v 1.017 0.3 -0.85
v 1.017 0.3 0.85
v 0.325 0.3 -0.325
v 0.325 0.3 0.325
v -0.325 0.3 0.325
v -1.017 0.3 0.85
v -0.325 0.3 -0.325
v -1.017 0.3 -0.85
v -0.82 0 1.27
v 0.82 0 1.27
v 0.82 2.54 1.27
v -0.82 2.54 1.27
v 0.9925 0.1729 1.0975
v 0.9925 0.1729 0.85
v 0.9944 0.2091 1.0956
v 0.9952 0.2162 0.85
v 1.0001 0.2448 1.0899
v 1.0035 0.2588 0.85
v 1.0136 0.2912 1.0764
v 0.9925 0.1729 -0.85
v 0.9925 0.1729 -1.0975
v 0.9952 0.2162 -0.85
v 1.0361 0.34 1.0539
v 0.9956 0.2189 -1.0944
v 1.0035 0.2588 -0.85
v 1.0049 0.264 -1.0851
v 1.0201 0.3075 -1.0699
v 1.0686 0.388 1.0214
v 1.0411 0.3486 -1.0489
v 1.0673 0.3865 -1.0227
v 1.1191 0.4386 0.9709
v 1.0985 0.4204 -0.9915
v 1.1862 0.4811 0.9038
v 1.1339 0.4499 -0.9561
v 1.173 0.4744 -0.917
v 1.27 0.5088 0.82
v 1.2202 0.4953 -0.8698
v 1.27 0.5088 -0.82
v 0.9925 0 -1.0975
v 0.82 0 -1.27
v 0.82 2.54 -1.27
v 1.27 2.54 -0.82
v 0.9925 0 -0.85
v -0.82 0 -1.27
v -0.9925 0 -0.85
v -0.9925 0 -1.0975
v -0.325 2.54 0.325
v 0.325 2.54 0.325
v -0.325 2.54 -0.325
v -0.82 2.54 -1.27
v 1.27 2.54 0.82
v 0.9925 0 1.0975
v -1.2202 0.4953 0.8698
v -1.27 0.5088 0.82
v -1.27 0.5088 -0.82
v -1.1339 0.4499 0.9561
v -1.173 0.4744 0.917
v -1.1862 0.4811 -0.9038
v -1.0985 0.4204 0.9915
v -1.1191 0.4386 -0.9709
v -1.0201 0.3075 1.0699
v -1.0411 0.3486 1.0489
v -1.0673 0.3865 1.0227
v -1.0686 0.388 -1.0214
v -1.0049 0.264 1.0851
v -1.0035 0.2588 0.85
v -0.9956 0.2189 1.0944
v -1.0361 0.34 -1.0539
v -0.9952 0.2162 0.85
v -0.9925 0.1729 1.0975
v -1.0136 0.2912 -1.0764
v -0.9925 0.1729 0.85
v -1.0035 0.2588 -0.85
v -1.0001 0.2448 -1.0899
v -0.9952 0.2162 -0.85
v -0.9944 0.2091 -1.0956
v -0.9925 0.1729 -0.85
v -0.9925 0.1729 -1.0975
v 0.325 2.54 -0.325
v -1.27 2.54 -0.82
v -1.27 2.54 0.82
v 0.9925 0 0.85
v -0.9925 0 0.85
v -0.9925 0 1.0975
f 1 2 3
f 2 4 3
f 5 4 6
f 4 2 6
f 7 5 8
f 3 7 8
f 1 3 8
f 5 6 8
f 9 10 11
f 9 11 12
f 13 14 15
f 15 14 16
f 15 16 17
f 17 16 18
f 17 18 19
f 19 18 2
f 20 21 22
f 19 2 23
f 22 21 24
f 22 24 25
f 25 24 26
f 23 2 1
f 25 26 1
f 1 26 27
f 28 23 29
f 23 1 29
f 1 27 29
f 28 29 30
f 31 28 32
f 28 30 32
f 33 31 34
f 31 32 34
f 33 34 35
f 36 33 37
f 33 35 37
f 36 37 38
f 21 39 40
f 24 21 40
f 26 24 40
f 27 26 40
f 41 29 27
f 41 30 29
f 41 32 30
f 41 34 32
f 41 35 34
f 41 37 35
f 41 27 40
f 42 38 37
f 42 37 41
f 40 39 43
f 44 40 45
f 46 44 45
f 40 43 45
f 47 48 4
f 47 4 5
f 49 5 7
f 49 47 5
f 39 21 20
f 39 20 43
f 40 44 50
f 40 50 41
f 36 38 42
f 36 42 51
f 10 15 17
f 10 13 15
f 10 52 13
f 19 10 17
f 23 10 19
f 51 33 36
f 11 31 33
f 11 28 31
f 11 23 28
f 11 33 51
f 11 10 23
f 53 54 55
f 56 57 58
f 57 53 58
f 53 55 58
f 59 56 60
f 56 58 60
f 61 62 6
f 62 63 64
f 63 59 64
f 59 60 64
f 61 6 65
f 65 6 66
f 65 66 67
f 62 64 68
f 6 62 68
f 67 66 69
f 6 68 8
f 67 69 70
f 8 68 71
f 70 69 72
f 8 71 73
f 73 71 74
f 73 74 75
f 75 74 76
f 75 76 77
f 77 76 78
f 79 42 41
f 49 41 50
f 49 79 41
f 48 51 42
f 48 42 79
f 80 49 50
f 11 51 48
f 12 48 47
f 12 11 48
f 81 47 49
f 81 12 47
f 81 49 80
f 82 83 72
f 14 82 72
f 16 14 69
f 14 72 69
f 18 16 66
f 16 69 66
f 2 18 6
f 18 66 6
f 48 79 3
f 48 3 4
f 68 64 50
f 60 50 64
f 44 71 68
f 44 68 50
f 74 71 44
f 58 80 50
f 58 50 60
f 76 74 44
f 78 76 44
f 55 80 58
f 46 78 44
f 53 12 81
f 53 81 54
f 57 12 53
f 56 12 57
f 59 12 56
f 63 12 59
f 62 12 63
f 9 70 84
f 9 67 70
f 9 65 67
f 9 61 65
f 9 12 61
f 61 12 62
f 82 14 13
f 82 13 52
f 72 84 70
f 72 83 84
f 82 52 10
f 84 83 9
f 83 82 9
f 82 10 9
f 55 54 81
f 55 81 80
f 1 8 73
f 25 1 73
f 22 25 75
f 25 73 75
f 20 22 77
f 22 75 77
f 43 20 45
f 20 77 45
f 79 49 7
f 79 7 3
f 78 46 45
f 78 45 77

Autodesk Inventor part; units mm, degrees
ref_plane "YZ Plane" through (0, 0, 0) normal (1, 0, 0) x (0, 1, 0)
ref_plane "XY Plane" through (0, 0, 0) normal (0, 0, 1) x (1, 0, 0)
sketch "Sketch1" plane through (0, 0, 0) normal (0, 1, 0) x (-1, 0, 0)
  line L0 (1.27, -1.27) -> (-1.27, -1.27)
  line L1 (-1.27, -1.27) -> (-1.27, 1.27)
  line L2 (-1.27, 1.27) -> (1.27, 1.27)
  line L3 (1.27, 1.27) -> (1.27, -1.27)
  point P0 (0, 0)
  point P1 (0, -1.27)
  point P2 (-1.27, 0)
  dimension "d0" = 2.54
  dimension "d1" = 2.54
extrude "Extrusion1" add sketch "Sketch1" along normal blind 2.54
sketch "Sketch2" plane through (0, 2.54, 0) normal (0, 1, 0) x (1, 0, 0)
  line L0 (-0.325, 0.325) -> (0.325, 0.325)
  line L1 (0.325, 0.325) -> (0.325, -0.325)
  line L2 (0.325, -0.325) -> (-0.325, -0.325)
  line L3 (-0.325, -0.325) -> (-0.325, 0.325)
  point P0 (0, 0)
  point P1 (0, 0.325)
  point P2 (0.325, 0)
  dimension "d4" = 0.65
  dimension "d5" = 0.65
extrude "Extrusion2" cut sketch "Sketch2" against normal up to next
chamfer "Chamfer1" distance 0.45 angle 45 4 edges at (1.27, 1.27, 1.27) (-1.27, 1.27, 1.27) (1.27, 1.27, -1.27) (-1.27, 1.27, -1.27)
sketch "Sketch3" plane through (0, 0, 0) normal (1, 0, 0) x (0, 1, 0)
  line L0 (0, -0.82) -> (2.54, -0.82) projected
  line L1 (0, 0.82) -> (0, -0.82) projected
  line L2 (2.54, 0.82) -> (0, 0.82) projected
  line L3 (2.54, -0.82) -> (2.54, 0.82) projected
  line L4 (2.54, 1.27) -> (2.54, 0.82) projected
  line L5 (2.54, 0.82) -> (0, 0.82) projected
  line L6 (0, 0.82) -> (0, 1.27) projected
  line L7 (0, 1.27) -> (2.54, 1.27) projected
  line L8 (2.54, -0.82) -> (2.54, -1.27) projected
  line L9 (2.54, -1.27) -> (0, -1.27) projected
  line L10 (0, -1.27) -> (0, -0.82) projected
  line L11 (0, -0.82) -> (2.54, -0.82) projected
  line L12 (0, 0.82) -> (0, -0.82) projected
  line L13 (0, 0.85) -> (0.3, 0.85)
  line L14 (0.3, 0.85) -> (0.3, -0.85)
  line L15 (0.3, -0.85) -> (0, -0.85)
  line L16 (0, -0.85) -> (0, 0.85)
  point P0 (0, 0)
  point P1 (0.3, 0)
  dimension "d11" = 0.3
  dimension "d16" = 1.7
extrude "Extrusion3" cut sketch "Sketch3" along normal mid plane 2.54 contours L1 L2 L14 L0 | L0 L14 L15 L10 | L6 L13 L14 L2
sketch "Sketch5" plane through (0, 0, 0) normal (0, 0, 1) x (1, 0, 0)
  line L0 (-1.27, 0.3) -> (-1.27, 2.54) projected
  line L1 (-1.27, 2.54) -> (-1.27, 0.3) projected
  line L2 (-1.27, 0.3) -> (-1.27, 2.54) projected
  line L3 (-1.24, 0.3) -> (-1.27, 0.3) projected
  line L4 (-1.27, 0.3) -> (-1.27, 2.54) projected
  line L5 (-1.27, 2.54) -> (-0.82, 2.54) projected
  line L6 (-0.82, 2.54) -> (-0.82, 0) projected
  line L7 (-0.82, 0) -> (-1.24, 0) projected
  line L8 (-1.24, 0) -> (-1.24, 0.3) projected
  line L9 (-0.9925, 0) -> (-0.9925, 0.1729)
  arc A0 (-0.9925, 0.1729) -> (-1.27, 0.5088) centre (-1.3346, 0.1729) ccw
  point P0 (0, 0)
extrude "Extrusion5" cut sketch "Sketch5" along normal mid plane 2.54 contours L0 A0 L9 L7 L8 L3
mirror "Mirror2" about plane through (0, 0, 0) normal (1, 0, 0) of "Extrusion5"
ref_plane "Work Plane1" through (0, -2.54, 0) normal (0, 1, 0) x (-1, 0, 0)
sketch "Sketch6" plane through (0, -2.54, 0) normal (0, 1, 0) x (-1, 0, 0)
  line L0 (0.325, -0.325) -> (-0.325, -0.325) projected
  line L1 (0.325, 0.325) -> (0.325, -0.325) projected
  line L2 (-0.325, 0.325) -> (0.325, 0.325) projected
  line L3 (-0.325, -0.325) -> (-0.325, 0.325) projected
  point P0 (0, 0)
equation "\"d1\" = d0"
equation "\"d4\" = d5"
properties part number "Housing male header - single" material "ABS Plastic"
